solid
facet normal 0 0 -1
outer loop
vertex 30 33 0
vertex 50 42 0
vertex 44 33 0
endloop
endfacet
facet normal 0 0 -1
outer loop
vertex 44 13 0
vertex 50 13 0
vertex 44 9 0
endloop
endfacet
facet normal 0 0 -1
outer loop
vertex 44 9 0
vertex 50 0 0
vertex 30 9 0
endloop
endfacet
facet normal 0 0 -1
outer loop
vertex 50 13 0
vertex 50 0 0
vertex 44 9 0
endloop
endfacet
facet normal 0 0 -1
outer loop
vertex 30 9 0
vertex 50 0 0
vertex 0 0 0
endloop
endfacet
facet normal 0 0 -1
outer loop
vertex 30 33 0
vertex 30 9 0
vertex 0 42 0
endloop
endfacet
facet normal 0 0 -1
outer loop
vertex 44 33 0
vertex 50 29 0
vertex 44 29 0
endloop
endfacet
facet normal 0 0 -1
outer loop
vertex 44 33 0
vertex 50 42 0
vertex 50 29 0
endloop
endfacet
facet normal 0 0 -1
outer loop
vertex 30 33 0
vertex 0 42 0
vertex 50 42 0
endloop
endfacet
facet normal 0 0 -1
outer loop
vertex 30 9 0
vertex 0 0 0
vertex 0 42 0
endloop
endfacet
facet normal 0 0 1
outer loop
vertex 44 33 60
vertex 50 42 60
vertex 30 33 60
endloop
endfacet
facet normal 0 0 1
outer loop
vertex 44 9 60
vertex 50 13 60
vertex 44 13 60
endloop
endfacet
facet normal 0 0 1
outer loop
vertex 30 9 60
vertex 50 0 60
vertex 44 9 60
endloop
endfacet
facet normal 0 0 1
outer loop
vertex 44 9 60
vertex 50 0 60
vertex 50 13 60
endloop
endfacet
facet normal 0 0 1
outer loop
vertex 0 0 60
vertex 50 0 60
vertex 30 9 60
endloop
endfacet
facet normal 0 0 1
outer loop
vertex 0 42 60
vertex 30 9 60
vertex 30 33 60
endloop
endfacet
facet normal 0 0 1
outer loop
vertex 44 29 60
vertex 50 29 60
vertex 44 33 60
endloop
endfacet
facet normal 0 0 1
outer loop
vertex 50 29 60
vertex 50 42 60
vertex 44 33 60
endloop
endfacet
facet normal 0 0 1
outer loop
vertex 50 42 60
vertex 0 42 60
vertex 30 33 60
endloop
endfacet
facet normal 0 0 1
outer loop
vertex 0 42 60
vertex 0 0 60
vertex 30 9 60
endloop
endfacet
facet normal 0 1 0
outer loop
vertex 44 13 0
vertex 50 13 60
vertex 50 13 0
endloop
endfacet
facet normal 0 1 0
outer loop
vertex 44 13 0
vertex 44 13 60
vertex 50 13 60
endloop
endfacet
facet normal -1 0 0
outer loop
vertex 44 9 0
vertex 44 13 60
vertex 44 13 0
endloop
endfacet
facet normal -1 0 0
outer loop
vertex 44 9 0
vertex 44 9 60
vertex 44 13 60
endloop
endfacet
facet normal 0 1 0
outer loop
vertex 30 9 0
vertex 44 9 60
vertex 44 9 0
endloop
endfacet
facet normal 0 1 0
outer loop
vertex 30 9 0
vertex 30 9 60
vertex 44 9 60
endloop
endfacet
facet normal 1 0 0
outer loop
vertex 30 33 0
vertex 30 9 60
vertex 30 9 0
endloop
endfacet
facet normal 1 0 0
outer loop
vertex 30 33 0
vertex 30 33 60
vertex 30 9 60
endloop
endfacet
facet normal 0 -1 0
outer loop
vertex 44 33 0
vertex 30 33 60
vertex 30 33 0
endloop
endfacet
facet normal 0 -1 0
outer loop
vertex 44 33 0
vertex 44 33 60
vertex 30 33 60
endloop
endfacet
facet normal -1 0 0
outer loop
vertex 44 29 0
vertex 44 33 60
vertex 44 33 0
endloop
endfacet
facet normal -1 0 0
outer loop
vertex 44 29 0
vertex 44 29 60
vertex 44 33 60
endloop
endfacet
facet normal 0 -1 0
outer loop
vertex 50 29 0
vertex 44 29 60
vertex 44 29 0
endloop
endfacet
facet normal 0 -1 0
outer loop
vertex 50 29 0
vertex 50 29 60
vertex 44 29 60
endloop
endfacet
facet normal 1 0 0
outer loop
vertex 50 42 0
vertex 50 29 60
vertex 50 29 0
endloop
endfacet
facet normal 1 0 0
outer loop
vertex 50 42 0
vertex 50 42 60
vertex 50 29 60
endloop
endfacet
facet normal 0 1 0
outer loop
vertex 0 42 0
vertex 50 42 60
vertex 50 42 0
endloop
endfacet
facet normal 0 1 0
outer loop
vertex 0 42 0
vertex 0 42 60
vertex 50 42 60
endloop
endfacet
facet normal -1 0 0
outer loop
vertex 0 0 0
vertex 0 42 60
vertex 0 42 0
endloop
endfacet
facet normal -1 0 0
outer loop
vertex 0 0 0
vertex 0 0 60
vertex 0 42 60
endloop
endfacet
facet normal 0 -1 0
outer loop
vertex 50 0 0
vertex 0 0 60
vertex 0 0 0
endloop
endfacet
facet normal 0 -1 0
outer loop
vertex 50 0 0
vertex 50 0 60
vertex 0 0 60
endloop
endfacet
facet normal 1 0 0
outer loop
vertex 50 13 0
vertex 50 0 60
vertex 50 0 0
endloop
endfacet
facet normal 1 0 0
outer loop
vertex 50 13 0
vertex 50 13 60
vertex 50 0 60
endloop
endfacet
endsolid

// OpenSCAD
$fn = 32;

// ----------------------------------------------------------------------
// T-slot rail: 50 x 42 mm section, 60 mm long
// ----------------------------------------------------------------------

// --- parameters (mm) ---
profile_height = 60;      // extrusion height
profile_points = 12;      // points of the closed outline

profile = [[0, 0], [50, 0], [50, 13], [44, 13], [44, 9], [30, 9], [30, 33], [44, 33], [44, 29], [50, 29], [50, 42], [0, 42]];  // single closed polygon, 12 points, counter clockwise

// --- the one profile operation ---
linear_extrude(height = profile_height) polygon(points = profile);
